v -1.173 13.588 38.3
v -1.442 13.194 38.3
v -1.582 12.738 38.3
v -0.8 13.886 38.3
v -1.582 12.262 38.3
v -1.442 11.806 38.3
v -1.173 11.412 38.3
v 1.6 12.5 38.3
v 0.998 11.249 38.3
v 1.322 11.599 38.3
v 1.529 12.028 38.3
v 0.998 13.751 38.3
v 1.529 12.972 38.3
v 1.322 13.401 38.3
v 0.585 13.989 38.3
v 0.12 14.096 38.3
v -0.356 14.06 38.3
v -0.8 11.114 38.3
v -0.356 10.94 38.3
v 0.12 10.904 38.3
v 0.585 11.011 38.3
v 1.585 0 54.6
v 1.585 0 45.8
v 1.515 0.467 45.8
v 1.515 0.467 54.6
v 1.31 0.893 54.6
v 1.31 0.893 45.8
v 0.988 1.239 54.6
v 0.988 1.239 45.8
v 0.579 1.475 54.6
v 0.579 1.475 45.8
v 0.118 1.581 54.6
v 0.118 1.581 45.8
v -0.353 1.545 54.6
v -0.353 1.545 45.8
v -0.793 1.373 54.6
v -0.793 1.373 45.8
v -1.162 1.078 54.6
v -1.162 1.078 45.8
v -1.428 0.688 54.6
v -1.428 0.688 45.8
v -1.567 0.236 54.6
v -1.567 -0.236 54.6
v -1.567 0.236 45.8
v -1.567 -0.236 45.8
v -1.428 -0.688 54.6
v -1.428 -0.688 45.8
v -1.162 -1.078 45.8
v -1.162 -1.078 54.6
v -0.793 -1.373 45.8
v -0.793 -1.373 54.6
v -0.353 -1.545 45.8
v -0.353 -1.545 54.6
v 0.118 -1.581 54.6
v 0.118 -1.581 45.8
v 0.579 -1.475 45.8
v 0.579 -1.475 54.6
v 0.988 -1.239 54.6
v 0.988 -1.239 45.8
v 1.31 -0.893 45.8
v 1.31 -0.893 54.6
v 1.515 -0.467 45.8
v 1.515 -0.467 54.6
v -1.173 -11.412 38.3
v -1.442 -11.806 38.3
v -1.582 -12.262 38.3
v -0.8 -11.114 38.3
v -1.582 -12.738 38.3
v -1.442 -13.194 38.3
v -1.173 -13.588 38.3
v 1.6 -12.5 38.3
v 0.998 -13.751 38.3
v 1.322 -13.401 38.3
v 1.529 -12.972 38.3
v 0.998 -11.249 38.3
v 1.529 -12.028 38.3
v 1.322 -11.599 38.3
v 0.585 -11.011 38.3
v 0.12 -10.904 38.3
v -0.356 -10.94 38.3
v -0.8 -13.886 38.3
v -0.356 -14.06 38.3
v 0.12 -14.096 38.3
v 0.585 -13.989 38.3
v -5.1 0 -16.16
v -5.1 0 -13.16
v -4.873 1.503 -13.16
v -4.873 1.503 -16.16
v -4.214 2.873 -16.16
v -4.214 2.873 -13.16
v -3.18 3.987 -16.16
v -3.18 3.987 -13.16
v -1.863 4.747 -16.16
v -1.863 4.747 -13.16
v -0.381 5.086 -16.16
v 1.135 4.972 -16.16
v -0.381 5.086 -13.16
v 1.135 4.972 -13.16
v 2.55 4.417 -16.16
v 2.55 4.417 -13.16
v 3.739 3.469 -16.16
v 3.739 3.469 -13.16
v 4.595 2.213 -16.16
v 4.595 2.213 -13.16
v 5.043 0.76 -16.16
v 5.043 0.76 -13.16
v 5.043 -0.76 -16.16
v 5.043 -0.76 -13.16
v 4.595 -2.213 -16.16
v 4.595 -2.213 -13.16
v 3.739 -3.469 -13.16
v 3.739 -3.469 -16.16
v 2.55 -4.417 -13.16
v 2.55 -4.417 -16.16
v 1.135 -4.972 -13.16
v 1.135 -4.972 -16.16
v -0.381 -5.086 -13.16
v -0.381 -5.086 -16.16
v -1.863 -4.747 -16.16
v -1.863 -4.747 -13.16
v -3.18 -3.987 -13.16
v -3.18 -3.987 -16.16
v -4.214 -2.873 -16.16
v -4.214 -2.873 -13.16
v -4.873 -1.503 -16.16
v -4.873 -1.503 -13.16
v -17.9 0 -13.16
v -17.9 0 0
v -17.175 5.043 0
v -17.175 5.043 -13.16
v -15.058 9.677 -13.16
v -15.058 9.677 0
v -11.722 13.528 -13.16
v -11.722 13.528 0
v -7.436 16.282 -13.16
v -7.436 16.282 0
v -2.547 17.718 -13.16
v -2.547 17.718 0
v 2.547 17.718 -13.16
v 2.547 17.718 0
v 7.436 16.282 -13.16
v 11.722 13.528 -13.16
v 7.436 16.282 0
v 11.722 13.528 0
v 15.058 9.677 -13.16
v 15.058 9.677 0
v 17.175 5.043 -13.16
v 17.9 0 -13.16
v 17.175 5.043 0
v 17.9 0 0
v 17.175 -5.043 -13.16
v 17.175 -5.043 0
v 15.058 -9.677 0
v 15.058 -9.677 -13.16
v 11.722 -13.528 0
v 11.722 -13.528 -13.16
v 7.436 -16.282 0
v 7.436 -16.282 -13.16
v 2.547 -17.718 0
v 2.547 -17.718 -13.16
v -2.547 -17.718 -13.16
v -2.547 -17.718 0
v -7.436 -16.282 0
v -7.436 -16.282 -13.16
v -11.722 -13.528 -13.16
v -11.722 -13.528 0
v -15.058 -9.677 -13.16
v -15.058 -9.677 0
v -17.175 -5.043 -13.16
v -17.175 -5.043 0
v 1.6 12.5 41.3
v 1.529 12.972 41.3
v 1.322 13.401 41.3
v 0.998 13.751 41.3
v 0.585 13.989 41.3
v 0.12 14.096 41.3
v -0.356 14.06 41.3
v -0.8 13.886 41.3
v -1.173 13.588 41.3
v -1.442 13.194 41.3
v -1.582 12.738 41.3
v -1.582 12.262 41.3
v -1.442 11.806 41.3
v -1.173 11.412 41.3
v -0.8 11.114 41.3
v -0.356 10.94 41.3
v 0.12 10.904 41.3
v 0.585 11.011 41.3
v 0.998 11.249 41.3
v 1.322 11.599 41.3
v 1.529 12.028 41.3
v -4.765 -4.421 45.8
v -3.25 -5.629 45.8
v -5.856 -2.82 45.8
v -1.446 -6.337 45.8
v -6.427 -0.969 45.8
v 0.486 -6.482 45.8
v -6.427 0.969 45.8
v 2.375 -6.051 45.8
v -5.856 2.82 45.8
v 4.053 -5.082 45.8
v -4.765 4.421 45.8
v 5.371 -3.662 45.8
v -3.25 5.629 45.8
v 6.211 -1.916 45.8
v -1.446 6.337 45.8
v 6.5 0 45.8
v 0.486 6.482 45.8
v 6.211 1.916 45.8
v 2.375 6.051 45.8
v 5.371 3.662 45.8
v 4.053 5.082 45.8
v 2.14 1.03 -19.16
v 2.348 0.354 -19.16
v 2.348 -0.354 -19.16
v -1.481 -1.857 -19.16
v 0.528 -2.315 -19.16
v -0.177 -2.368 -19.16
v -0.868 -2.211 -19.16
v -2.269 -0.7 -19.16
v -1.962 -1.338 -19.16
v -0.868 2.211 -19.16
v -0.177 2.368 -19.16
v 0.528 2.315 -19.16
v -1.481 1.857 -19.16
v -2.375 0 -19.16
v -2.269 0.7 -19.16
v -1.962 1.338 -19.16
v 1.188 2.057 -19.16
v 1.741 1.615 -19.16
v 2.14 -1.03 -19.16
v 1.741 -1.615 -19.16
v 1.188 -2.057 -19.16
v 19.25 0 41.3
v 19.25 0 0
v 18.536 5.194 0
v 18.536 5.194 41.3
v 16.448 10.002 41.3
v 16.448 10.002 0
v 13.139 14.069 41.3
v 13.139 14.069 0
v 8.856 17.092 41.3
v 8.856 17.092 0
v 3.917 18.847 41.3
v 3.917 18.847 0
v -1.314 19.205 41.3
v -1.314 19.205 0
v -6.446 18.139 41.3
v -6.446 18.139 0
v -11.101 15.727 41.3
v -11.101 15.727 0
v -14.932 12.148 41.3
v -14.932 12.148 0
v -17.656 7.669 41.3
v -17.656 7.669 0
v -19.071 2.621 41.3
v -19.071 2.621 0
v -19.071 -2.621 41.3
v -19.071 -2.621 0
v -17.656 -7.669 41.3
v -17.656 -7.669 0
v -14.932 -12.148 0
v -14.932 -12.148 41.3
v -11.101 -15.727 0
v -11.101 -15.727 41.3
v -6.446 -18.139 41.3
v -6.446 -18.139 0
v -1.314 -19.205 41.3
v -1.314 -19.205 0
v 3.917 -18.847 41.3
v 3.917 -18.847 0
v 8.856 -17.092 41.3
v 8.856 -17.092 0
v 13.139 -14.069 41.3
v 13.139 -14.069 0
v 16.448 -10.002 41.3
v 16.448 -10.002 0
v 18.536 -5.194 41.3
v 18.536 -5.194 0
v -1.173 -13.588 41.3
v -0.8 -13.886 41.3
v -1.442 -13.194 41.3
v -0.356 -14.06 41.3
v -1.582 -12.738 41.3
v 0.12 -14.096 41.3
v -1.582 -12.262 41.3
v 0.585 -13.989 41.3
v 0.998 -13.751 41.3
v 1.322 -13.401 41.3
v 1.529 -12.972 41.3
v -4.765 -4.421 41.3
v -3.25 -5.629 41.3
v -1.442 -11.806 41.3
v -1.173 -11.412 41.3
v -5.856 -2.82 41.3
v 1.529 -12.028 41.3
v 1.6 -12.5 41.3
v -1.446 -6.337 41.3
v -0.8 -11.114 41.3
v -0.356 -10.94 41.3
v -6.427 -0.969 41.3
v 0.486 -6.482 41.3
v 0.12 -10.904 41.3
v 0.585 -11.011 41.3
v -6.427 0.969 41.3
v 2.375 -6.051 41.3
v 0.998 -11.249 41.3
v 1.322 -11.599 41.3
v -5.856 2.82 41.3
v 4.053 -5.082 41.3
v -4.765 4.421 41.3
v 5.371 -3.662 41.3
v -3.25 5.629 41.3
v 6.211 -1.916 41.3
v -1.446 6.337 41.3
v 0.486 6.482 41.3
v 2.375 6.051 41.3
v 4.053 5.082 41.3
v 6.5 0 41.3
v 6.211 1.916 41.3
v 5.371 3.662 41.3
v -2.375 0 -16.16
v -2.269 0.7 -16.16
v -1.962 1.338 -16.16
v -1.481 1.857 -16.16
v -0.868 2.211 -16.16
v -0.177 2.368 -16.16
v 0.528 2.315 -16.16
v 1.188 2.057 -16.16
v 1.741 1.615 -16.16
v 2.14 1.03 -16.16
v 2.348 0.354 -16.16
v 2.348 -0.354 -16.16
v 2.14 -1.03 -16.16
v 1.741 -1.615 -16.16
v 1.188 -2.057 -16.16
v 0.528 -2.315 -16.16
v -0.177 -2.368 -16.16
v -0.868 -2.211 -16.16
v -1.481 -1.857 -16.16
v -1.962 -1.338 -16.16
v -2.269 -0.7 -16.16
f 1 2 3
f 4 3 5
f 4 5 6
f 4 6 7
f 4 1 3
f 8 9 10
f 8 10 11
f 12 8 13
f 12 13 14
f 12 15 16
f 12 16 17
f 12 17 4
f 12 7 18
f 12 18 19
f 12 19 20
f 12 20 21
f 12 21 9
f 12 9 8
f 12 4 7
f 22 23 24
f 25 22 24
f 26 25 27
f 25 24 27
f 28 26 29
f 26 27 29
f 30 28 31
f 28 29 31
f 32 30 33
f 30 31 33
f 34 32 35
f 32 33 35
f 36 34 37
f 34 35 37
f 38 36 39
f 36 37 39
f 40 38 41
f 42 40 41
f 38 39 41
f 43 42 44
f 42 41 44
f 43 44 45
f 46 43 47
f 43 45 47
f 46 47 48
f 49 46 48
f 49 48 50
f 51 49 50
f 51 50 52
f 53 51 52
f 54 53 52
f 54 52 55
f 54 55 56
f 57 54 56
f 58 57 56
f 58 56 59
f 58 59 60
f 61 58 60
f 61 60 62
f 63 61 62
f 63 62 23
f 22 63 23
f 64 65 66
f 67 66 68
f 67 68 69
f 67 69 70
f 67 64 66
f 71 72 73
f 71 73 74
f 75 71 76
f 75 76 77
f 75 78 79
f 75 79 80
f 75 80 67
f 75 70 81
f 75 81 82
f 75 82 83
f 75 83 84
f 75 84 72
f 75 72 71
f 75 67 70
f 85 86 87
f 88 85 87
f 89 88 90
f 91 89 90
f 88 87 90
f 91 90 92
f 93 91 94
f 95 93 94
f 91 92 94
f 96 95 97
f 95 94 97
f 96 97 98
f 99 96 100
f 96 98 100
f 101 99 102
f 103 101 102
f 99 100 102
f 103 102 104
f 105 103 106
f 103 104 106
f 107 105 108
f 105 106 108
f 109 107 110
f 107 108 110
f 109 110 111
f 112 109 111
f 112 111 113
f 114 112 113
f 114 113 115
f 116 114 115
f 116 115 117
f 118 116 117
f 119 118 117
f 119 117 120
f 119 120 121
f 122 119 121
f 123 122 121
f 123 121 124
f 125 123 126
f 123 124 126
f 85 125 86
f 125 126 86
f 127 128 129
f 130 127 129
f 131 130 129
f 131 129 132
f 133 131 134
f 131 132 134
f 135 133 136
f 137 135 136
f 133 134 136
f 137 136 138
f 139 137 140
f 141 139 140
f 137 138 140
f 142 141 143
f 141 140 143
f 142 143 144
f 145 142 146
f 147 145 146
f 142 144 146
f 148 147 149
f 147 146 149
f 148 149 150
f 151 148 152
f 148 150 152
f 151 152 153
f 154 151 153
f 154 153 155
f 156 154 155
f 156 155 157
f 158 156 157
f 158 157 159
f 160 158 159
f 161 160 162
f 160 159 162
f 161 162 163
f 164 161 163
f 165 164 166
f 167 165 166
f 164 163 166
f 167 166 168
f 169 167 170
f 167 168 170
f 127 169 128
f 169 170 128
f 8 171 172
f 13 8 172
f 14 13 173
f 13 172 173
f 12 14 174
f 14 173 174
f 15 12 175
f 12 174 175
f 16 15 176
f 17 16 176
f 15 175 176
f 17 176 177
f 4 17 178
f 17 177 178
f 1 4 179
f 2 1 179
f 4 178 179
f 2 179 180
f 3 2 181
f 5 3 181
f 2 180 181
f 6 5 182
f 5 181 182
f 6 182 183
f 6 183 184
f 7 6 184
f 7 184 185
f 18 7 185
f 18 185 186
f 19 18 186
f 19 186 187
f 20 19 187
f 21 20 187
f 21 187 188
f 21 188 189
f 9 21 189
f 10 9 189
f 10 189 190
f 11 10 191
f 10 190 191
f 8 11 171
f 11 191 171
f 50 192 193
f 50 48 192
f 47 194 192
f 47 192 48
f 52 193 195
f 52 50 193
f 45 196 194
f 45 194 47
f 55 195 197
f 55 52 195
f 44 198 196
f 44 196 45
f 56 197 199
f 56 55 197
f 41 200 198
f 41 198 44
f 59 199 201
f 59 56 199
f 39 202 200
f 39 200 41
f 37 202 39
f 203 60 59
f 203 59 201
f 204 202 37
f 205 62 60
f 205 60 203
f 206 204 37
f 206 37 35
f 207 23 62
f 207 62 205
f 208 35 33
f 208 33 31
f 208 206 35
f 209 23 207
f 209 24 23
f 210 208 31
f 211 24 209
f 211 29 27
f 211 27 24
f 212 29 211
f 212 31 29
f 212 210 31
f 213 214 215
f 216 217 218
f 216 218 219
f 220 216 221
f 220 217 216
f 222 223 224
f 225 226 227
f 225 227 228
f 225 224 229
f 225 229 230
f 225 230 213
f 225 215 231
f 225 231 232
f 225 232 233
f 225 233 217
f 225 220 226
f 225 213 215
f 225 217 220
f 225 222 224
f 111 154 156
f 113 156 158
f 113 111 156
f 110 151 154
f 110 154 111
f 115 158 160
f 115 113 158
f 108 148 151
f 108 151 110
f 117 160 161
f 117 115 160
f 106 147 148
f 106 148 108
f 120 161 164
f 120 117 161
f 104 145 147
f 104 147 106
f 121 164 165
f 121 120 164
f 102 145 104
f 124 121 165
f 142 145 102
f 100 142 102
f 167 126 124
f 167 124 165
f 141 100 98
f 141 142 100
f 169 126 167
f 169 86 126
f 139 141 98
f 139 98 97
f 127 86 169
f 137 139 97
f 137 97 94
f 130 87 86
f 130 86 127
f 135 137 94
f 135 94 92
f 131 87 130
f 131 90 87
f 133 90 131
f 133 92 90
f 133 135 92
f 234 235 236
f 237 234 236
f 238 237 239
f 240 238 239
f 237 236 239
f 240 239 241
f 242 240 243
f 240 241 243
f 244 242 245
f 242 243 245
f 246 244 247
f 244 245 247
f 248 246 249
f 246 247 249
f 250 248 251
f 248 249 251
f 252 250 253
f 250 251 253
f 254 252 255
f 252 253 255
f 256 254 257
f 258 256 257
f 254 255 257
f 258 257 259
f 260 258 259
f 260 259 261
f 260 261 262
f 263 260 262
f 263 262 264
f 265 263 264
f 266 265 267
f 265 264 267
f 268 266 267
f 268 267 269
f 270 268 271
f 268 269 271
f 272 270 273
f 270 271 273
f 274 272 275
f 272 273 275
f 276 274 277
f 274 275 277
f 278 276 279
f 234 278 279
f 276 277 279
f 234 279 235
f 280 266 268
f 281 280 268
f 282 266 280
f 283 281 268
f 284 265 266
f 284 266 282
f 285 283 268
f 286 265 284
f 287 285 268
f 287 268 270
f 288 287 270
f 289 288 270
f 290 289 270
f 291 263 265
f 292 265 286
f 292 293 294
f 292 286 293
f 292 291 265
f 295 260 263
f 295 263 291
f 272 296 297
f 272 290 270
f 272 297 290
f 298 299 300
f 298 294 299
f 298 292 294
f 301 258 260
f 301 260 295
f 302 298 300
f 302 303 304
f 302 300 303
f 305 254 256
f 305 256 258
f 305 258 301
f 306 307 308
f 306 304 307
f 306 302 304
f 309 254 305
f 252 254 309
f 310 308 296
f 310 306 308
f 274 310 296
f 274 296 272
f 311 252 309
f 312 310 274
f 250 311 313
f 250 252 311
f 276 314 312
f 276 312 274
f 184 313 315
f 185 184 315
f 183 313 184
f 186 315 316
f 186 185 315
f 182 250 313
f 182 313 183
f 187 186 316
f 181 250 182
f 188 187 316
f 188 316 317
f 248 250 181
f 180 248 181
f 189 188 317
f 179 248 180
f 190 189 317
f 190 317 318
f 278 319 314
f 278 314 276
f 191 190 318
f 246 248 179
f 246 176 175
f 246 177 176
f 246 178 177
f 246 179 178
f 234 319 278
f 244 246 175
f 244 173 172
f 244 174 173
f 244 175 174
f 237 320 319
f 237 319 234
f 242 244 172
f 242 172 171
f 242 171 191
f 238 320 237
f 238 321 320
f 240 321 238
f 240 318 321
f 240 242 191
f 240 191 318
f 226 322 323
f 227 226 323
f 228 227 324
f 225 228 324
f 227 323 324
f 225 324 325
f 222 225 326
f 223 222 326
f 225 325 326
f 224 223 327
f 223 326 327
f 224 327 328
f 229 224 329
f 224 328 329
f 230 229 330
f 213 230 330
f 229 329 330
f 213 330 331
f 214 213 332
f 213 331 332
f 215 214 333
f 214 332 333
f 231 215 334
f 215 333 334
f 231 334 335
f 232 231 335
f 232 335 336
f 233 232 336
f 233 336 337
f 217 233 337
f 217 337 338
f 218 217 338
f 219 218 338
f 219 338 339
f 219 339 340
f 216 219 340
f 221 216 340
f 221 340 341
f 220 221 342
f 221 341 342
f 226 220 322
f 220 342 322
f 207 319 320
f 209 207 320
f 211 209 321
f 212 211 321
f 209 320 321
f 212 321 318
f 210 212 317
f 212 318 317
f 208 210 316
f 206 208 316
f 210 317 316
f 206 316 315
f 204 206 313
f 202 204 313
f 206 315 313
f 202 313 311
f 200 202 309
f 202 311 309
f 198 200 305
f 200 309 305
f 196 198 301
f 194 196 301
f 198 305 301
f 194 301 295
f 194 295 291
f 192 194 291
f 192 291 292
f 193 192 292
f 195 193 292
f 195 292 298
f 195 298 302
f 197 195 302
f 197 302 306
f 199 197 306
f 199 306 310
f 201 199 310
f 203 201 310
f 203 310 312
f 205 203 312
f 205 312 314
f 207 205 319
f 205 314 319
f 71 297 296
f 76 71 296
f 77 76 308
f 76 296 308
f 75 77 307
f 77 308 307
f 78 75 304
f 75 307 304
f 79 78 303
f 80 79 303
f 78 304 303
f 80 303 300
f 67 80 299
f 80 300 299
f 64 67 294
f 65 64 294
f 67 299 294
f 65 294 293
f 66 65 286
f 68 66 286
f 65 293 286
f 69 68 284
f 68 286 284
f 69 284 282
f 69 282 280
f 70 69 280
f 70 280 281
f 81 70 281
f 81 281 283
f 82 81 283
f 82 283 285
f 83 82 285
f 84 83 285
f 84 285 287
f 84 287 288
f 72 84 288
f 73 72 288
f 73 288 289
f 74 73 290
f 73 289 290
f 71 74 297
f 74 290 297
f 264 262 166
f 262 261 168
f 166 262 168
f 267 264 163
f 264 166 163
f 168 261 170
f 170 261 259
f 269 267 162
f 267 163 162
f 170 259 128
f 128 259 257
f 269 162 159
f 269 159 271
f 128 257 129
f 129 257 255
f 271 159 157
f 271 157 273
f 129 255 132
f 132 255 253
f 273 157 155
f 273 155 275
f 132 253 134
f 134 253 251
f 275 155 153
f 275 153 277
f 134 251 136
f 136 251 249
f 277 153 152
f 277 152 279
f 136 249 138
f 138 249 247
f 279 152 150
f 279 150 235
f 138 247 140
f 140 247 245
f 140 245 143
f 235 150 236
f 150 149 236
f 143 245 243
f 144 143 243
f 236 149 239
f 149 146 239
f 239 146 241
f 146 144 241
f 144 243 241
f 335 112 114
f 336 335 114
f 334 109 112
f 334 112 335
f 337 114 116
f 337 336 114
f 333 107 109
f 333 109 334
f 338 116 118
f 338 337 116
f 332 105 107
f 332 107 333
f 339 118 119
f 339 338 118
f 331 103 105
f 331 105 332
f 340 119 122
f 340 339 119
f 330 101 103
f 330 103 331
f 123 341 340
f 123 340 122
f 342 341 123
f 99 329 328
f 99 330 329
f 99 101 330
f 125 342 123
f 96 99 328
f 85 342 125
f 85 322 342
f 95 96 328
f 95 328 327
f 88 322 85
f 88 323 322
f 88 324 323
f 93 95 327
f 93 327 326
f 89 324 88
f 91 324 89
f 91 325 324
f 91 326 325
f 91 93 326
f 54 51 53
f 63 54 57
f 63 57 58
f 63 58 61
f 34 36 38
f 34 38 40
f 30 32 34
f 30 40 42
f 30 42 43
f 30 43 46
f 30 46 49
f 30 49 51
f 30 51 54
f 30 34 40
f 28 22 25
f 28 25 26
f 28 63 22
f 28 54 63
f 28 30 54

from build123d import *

# Parameters (mm, degrees)
SKETCH1_R           = 19.25
BOSS_EXTRUDE1_DEPTH = 41.3
SKETCH3_R           = 1.585
BOSS_EXTRUDE2_DEPTH = 13.3
SKETCH4_R           = 6.5
BOSS_EXTRUDE3_DEPTH = 4.5
SKETCH5_R           = 17.9
BOSS_EXTRUDE4_DEPTH = 13.16
SKETCH6_R           = 5.1
BOSS_EXTRUDE5_DEPTH = 3
SKETCH7_R           = 2.375
BOSS_EXTRUDE6_DEPTH = 3
SKETCH8_R           = 1.6
CUT_EXTRUDE1_DEPTH  = 2.999994


with BuildPart() as part:
    # Sketch1 → Boss-Extrude1 (new body)
    with BuildSketch(Plane.XY):
        Circle(SKETCH1_R)
    extrude(amount=BOSS_EXTRUDE1_DEPTH)

    # Sketch3 → Boss-Extrude2 (add)
    with BuildSketch(Plane.XY.offset(41.3)):
        Circle(SKETCH3_R)
    extrude(amount=BOSS_EXTRUDE2_DEPTH)

    # Sketch4 → Boss-Extrude3 (add)
    with BuildSketch(Plane.XY.offset(41.3)):
        Circle(SKETCH4_R)
    extrude(amount=BOSS_EXTRUDE3_DEPTH)

    # Sketch5 → Boss-Extrude4 (add)
    with BuildSketch(Plane(origin=(0, 0, 0), x_dir=(-1, 0, 0), z_dir=(0, 0, -1))):
        Circle(SKETCH5_R)
    extrude(amount=BOSS_EXTRUDE4_DEPTH)

    # Sketch6 → Boss-Extrude5 (add)
    with BuildSketch(Plane(origin=(0, 0, -13.16), x_dir=(-1, 0, 0), z_dir=(0, 0, -1))):
        Circle(SKETCH6_R)
    extrude(amount=BOSS_EXTRUDE5_DEPTH)

    # Sketch7 → Boss-Extrude6 (add)
    with BuildSketch(Plane(origin=(0, 0, -16.16), x_dir=(-1, 0, 0), z_dir=(0, 0, -1))):
        Circle(SKETCH7_R)
    extrude(amount=BOSS_EXTRUDE6_DEPTH)

    # Sketch8 → Cut-Extrude1 (cut)
    with BuildSketch(Plane.XY.offset(41.3)):
        with Locations((0, 12.5)):
            Circle(SKETCH8_R)
        with Locations((0, -12.5)):
            Circle(SKETCH8_R)
    extrude(amount=-CUT_EXTRUDE1_DEPTH, mode=Mode.SUBTRACT)


solid = part.part
